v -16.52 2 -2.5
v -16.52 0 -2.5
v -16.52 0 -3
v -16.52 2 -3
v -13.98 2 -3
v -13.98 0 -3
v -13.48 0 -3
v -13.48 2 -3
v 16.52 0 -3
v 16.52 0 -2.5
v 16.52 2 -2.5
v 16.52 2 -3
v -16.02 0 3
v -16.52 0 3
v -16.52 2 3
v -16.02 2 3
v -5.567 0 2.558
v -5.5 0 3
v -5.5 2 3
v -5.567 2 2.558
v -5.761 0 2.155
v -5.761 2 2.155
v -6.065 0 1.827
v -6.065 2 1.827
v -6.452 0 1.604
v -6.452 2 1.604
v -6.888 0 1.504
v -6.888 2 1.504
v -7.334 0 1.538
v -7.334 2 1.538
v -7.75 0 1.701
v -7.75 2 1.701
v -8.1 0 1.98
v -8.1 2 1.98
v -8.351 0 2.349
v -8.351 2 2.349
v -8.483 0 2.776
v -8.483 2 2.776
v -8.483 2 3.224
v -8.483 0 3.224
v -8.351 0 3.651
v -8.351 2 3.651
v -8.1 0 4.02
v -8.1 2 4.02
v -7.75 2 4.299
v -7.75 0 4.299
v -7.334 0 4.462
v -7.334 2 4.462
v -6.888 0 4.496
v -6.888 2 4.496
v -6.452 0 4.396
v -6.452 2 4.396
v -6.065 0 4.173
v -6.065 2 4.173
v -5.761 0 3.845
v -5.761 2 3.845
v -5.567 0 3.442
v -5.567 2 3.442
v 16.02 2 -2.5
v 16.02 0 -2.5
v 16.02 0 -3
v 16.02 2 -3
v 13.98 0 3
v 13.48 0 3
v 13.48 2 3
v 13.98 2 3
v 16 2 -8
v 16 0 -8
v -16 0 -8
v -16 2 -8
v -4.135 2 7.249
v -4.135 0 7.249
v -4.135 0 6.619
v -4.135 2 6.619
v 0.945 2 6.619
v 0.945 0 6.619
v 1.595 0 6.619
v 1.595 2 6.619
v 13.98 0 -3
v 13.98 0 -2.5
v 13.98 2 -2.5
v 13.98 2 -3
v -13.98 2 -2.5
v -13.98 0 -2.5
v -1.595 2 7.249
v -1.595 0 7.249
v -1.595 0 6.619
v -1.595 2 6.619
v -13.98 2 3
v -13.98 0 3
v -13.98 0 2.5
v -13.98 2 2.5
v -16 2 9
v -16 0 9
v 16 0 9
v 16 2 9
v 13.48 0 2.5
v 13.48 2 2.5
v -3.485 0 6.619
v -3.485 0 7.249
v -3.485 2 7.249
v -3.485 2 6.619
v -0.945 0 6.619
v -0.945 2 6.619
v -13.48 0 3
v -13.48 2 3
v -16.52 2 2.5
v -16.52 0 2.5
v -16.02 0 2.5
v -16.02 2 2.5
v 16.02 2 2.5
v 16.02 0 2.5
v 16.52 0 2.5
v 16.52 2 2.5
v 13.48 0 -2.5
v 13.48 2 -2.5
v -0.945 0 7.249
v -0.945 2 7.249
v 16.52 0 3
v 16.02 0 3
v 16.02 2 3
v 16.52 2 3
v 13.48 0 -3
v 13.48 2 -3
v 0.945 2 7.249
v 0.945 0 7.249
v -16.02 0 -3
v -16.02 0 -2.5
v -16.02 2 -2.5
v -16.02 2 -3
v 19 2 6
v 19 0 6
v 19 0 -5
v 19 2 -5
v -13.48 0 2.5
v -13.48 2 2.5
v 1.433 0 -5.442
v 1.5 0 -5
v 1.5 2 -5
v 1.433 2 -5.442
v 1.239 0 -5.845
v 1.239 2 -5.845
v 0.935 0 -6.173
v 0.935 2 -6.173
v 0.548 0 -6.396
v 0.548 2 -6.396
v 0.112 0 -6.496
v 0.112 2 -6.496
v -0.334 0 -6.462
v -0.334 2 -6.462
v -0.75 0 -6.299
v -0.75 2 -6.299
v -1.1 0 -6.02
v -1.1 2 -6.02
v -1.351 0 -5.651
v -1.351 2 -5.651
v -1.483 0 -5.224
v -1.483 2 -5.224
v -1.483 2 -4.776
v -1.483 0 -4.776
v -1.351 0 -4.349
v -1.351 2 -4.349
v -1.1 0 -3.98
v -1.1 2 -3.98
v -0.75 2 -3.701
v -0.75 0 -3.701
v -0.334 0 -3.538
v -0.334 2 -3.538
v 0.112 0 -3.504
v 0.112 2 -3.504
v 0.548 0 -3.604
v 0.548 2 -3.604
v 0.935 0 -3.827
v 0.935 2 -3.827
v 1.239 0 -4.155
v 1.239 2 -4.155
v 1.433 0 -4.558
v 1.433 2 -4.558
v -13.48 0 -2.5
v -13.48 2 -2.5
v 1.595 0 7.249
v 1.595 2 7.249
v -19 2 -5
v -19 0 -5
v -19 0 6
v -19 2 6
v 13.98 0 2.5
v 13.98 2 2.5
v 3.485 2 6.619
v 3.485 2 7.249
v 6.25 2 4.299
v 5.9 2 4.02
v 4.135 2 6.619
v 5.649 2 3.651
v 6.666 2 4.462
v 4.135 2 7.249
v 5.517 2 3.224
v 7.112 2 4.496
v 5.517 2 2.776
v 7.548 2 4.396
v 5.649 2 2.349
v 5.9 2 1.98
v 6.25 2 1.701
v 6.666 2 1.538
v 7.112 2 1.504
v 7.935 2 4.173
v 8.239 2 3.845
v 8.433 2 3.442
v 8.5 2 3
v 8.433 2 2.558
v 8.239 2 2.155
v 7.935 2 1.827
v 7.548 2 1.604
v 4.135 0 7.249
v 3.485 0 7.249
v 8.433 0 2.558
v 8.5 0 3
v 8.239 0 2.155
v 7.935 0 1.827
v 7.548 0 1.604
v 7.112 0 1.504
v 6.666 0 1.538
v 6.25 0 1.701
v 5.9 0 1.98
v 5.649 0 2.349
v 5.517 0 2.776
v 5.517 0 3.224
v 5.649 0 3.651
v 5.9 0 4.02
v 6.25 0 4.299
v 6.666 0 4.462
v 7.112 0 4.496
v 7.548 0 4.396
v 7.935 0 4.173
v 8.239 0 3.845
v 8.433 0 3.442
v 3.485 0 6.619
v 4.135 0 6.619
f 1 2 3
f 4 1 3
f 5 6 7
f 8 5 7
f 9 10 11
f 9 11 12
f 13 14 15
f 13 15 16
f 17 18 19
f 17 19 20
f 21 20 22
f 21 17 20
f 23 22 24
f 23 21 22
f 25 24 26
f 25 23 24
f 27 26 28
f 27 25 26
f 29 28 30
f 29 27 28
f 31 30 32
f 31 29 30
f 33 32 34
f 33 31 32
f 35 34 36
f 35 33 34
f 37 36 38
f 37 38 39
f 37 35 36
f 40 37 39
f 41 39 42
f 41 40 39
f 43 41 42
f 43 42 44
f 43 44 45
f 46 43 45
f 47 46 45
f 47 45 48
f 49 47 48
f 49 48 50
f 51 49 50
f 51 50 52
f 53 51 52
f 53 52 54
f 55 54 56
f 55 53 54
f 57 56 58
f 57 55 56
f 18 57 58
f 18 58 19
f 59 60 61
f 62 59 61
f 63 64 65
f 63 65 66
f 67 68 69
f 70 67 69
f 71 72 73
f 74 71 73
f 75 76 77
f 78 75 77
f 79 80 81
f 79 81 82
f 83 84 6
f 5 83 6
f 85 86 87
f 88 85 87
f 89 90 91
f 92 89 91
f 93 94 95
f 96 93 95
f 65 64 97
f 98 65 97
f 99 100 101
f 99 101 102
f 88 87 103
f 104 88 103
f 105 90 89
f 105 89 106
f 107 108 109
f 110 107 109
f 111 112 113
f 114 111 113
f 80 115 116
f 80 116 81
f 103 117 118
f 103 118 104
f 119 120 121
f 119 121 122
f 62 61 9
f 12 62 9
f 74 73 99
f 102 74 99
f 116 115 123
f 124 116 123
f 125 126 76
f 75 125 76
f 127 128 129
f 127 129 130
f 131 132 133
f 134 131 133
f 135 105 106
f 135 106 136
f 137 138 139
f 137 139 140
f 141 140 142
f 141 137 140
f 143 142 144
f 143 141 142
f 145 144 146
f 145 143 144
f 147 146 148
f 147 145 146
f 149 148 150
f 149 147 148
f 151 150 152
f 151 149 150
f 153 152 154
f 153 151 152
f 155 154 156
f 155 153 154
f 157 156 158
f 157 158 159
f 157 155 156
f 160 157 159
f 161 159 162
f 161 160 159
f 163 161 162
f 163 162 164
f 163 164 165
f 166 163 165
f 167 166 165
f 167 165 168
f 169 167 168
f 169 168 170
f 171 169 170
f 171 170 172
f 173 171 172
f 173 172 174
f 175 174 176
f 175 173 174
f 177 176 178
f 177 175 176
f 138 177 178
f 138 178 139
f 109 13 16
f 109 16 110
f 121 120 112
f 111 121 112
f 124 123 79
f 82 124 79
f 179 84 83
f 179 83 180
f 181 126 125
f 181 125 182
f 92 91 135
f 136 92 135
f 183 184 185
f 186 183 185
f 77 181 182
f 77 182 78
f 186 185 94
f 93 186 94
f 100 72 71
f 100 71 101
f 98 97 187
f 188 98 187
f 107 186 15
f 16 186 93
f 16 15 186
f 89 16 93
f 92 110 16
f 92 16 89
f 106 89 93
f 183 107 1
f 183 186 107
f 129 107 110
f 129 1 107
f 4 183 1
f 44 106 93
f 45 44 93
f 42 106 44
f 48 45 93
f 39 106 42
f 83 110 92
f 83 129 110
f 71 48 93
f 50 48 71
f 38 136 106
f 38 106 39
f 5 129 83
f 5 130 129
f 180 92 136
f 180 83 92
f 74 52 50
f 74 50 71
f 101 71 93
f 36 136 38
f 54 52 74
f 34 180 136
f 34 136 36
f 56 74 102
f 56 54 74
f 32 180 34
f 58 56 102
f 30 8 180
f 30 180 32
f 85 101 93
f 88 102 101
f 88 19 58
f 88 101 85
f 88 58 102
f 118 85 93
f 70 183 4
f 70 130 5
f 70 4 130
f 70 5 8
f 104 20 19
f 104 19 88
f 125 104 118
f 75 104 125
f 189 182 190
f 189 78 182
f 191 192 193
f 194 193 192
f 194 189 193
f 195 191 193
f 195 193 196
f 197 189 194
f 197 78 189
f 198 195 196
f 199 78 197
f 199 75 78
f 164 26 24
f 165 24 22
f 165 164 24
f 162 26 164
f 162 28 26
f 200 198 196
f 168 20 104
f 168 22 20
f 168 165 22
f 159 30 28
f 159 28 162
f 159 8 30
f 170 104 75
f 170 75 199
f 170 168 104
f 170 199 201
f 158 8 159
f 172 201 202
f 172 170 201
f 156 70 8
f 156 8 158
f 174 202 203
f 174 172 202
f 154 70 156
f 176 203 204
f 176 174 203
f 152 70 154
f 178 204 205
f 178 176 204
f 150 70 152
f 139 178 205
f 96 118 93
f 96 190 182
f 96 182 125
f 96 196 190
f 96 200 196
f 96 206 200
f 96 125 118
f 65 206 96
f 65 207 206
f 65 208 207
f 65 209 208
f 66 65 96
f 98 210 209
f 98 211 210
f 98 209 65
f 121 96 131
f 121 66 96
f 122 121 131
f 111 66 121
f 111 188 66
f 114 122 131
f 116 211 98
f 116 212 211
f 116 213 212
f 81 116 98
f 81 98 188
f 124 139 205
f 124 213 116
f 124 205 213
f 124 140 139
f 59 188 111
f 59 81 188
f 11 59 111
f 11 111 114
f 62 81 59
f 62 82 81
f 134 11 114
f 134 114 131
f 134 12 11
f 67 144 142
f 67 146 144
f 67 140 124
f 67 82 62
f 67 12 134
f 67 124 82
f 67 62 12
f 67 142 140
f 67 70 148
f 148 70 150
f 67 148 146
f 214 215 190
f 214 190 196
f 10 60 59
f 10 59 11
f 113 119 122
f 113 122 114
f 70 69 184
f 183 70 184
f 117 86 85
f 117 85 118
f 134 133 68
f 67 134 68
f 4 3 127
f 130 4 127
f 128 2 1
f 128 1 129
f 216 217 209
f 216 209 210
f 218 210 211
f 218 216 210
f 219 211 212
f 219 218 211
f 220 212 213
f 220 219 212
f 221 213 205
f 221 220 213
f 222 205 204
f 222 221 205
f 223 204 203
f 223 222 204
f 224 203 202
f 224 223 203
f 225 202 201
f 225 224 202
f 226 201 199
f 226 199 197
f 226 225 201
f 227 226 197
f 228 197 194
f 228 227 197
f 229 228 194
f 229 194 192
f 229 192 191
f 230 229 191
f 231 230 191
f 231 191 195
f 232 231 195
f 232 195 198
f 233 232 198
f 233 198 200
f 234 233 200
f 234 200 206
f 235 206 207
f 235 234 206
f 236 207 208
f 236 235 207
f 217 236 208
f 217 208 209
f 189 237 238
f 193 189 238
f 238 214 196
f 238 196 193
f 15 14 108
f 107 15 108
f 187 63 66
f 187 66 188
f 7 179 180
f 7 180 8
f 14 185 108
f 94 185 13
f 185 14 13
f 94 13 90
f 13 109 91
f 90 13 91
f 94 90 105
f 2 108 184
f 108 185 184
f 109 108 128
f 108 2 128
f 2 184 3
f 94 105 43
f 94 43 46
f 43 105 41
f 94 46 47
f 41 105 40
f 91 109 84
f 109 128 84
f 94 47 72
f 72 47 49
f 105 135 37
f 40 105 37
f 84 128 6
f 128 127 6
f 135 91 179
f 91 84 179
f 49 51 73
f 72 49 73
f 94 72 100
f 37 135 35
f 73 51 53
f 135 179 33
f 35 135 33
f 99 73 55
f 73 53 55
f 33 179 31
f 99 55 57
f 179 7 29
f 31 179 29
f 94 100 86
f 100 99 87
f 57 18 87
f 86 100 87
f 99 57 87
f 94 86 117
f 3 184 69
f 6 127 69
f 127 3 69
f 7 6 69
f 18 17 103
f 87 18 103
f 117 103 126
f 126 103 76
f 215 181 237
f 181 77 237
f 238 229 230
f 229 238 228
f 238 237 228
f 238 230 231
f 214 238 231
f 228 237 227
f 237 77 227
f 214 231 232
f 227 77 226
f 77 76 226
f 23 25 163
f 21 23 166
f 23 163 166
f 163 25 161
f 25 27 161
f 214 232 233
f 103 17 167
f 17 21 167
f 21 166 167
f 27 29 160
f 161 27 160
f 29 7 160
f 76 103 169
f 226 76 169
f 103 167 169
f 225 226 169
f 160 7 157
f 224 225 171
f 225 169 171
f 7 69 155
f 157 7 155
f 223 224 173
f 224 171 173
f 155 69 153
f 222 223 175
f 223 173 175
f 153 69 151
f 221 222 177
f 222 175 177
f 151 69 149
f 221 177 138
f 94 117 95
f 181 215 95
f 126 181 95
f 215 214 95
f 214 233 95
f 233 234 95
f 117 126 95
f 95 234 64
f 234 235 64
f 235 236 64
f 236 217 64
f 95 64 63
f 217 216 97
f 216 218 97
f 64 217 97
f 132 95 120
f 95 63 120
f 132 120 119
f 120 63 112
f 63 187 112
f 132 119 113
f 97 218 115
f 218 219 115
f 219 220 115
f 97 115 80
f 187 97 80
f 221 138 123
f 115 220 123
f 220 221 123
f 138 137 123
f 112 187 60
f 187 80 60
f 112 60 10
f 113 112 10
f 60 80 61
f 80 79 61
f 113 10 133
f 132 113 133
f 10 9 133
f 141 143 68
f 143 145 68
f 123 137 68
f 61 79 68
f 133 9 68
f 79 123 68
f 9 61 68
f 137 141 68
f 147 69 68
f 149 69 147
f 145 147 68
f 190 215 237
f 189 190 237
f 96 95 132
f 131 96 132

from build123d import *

# Parameters (mm, degrees)
SKETCH1_R           = 1.5
SKETCH1_W           = 0.5
SKETCH1_H           = 0.5
SKETCH1_W_2         = 0.65
SKETCH1_H_2         = 0.63
BOSS_EXTRUDE1_DEPTH = 2


with BuildPart() as part:
    # Sketch1 → Boss-Extrude1 (new body)
    with BuildSketch(Plane(origin=(0, 0, 0), x_dir=(1, 0, 0), z_dir=(0, 1, 0))):
        Polygon((-19, 5), (-19, -6), (-16, -9), (16, -9), (19, -6), (19, 5), (16, 8), (-16, 8), align=None)
        with Locations((-7, -3)):
            Circle(SKETCH1_R, mode=Mode.SUBTRACT)
        with Locations((7, -3)):
            Circle(SKETCH1_R, mode=Mode.SUBTRACT)
        with Locations((0, 5)):
            Circle(SKETCH1_R, mode=Mode.SUBTRACT)
        with Locations((-16.27, 2.75)):
            Rectangle(SKETCH1_W, SKETCH1_H, mode=Mode.SUBTRACT)
        with Locations((-16.27, -2.75)):
            Rectangle(SKETCH1_W, SKETCH1_H, mode=Mode.SUBTRACT)
        with Locations((-13.73, -2.75)):
            Rectangle(SKETCH1_W, SKETCH1_H, mode=Mode.SUBTRACT)
        with Locations((-13.73, 2.75)):
            Rectangle(SKETCH1_W, SKETCH1_H, mode=Mode.SUBTRACT)
        with Locations((13.73, 2.75)):
            Rectangle(SKETCH1_W, SKETCH1_H, mode=Mode.SUBTRACT)
        with Locations((13.73, -2.75)):
            Rectangle(SKETCH1_W, SKETCH1_H, mode=Mode.SUBTRACT)
        with Locations((16.27, -2.75)):
            Rectangle(SKETCH1_W, SKETCH1_H, mode=Mode.SUBTRACT)
        with Locations((16.27, 2.75)):
            Rectangle(SKETCH1_W, SKETCH1_H, mode=Mode.SUBTRACT)
        with Locations((-3.81, -6.934)):
            Rectangle(SKETCH1_W_2, SKETCH1_H_2, mode=Mode.SUBTRACT)
        with Locations((-1.27, -6.934)):
            Rectangle(SKETCH1_W_2, SKETCH1_H_2, mode=Mode.SUBTRACT)
        with Locations((1.27, -6.934)):
            Rectangle(SKETCH1_W_2, SKETCH1_H_2, mode=Mode.SUBTRACT)
        with Locations((3.81, -6.934)):
            Rectangle(SKETCH1_W_2, SKETCH1_H_2, mode=Mode.SUBTRACT)
    extrude(amount=BOSS_EXTRUDE1_DEPTH)


solid = part.part
